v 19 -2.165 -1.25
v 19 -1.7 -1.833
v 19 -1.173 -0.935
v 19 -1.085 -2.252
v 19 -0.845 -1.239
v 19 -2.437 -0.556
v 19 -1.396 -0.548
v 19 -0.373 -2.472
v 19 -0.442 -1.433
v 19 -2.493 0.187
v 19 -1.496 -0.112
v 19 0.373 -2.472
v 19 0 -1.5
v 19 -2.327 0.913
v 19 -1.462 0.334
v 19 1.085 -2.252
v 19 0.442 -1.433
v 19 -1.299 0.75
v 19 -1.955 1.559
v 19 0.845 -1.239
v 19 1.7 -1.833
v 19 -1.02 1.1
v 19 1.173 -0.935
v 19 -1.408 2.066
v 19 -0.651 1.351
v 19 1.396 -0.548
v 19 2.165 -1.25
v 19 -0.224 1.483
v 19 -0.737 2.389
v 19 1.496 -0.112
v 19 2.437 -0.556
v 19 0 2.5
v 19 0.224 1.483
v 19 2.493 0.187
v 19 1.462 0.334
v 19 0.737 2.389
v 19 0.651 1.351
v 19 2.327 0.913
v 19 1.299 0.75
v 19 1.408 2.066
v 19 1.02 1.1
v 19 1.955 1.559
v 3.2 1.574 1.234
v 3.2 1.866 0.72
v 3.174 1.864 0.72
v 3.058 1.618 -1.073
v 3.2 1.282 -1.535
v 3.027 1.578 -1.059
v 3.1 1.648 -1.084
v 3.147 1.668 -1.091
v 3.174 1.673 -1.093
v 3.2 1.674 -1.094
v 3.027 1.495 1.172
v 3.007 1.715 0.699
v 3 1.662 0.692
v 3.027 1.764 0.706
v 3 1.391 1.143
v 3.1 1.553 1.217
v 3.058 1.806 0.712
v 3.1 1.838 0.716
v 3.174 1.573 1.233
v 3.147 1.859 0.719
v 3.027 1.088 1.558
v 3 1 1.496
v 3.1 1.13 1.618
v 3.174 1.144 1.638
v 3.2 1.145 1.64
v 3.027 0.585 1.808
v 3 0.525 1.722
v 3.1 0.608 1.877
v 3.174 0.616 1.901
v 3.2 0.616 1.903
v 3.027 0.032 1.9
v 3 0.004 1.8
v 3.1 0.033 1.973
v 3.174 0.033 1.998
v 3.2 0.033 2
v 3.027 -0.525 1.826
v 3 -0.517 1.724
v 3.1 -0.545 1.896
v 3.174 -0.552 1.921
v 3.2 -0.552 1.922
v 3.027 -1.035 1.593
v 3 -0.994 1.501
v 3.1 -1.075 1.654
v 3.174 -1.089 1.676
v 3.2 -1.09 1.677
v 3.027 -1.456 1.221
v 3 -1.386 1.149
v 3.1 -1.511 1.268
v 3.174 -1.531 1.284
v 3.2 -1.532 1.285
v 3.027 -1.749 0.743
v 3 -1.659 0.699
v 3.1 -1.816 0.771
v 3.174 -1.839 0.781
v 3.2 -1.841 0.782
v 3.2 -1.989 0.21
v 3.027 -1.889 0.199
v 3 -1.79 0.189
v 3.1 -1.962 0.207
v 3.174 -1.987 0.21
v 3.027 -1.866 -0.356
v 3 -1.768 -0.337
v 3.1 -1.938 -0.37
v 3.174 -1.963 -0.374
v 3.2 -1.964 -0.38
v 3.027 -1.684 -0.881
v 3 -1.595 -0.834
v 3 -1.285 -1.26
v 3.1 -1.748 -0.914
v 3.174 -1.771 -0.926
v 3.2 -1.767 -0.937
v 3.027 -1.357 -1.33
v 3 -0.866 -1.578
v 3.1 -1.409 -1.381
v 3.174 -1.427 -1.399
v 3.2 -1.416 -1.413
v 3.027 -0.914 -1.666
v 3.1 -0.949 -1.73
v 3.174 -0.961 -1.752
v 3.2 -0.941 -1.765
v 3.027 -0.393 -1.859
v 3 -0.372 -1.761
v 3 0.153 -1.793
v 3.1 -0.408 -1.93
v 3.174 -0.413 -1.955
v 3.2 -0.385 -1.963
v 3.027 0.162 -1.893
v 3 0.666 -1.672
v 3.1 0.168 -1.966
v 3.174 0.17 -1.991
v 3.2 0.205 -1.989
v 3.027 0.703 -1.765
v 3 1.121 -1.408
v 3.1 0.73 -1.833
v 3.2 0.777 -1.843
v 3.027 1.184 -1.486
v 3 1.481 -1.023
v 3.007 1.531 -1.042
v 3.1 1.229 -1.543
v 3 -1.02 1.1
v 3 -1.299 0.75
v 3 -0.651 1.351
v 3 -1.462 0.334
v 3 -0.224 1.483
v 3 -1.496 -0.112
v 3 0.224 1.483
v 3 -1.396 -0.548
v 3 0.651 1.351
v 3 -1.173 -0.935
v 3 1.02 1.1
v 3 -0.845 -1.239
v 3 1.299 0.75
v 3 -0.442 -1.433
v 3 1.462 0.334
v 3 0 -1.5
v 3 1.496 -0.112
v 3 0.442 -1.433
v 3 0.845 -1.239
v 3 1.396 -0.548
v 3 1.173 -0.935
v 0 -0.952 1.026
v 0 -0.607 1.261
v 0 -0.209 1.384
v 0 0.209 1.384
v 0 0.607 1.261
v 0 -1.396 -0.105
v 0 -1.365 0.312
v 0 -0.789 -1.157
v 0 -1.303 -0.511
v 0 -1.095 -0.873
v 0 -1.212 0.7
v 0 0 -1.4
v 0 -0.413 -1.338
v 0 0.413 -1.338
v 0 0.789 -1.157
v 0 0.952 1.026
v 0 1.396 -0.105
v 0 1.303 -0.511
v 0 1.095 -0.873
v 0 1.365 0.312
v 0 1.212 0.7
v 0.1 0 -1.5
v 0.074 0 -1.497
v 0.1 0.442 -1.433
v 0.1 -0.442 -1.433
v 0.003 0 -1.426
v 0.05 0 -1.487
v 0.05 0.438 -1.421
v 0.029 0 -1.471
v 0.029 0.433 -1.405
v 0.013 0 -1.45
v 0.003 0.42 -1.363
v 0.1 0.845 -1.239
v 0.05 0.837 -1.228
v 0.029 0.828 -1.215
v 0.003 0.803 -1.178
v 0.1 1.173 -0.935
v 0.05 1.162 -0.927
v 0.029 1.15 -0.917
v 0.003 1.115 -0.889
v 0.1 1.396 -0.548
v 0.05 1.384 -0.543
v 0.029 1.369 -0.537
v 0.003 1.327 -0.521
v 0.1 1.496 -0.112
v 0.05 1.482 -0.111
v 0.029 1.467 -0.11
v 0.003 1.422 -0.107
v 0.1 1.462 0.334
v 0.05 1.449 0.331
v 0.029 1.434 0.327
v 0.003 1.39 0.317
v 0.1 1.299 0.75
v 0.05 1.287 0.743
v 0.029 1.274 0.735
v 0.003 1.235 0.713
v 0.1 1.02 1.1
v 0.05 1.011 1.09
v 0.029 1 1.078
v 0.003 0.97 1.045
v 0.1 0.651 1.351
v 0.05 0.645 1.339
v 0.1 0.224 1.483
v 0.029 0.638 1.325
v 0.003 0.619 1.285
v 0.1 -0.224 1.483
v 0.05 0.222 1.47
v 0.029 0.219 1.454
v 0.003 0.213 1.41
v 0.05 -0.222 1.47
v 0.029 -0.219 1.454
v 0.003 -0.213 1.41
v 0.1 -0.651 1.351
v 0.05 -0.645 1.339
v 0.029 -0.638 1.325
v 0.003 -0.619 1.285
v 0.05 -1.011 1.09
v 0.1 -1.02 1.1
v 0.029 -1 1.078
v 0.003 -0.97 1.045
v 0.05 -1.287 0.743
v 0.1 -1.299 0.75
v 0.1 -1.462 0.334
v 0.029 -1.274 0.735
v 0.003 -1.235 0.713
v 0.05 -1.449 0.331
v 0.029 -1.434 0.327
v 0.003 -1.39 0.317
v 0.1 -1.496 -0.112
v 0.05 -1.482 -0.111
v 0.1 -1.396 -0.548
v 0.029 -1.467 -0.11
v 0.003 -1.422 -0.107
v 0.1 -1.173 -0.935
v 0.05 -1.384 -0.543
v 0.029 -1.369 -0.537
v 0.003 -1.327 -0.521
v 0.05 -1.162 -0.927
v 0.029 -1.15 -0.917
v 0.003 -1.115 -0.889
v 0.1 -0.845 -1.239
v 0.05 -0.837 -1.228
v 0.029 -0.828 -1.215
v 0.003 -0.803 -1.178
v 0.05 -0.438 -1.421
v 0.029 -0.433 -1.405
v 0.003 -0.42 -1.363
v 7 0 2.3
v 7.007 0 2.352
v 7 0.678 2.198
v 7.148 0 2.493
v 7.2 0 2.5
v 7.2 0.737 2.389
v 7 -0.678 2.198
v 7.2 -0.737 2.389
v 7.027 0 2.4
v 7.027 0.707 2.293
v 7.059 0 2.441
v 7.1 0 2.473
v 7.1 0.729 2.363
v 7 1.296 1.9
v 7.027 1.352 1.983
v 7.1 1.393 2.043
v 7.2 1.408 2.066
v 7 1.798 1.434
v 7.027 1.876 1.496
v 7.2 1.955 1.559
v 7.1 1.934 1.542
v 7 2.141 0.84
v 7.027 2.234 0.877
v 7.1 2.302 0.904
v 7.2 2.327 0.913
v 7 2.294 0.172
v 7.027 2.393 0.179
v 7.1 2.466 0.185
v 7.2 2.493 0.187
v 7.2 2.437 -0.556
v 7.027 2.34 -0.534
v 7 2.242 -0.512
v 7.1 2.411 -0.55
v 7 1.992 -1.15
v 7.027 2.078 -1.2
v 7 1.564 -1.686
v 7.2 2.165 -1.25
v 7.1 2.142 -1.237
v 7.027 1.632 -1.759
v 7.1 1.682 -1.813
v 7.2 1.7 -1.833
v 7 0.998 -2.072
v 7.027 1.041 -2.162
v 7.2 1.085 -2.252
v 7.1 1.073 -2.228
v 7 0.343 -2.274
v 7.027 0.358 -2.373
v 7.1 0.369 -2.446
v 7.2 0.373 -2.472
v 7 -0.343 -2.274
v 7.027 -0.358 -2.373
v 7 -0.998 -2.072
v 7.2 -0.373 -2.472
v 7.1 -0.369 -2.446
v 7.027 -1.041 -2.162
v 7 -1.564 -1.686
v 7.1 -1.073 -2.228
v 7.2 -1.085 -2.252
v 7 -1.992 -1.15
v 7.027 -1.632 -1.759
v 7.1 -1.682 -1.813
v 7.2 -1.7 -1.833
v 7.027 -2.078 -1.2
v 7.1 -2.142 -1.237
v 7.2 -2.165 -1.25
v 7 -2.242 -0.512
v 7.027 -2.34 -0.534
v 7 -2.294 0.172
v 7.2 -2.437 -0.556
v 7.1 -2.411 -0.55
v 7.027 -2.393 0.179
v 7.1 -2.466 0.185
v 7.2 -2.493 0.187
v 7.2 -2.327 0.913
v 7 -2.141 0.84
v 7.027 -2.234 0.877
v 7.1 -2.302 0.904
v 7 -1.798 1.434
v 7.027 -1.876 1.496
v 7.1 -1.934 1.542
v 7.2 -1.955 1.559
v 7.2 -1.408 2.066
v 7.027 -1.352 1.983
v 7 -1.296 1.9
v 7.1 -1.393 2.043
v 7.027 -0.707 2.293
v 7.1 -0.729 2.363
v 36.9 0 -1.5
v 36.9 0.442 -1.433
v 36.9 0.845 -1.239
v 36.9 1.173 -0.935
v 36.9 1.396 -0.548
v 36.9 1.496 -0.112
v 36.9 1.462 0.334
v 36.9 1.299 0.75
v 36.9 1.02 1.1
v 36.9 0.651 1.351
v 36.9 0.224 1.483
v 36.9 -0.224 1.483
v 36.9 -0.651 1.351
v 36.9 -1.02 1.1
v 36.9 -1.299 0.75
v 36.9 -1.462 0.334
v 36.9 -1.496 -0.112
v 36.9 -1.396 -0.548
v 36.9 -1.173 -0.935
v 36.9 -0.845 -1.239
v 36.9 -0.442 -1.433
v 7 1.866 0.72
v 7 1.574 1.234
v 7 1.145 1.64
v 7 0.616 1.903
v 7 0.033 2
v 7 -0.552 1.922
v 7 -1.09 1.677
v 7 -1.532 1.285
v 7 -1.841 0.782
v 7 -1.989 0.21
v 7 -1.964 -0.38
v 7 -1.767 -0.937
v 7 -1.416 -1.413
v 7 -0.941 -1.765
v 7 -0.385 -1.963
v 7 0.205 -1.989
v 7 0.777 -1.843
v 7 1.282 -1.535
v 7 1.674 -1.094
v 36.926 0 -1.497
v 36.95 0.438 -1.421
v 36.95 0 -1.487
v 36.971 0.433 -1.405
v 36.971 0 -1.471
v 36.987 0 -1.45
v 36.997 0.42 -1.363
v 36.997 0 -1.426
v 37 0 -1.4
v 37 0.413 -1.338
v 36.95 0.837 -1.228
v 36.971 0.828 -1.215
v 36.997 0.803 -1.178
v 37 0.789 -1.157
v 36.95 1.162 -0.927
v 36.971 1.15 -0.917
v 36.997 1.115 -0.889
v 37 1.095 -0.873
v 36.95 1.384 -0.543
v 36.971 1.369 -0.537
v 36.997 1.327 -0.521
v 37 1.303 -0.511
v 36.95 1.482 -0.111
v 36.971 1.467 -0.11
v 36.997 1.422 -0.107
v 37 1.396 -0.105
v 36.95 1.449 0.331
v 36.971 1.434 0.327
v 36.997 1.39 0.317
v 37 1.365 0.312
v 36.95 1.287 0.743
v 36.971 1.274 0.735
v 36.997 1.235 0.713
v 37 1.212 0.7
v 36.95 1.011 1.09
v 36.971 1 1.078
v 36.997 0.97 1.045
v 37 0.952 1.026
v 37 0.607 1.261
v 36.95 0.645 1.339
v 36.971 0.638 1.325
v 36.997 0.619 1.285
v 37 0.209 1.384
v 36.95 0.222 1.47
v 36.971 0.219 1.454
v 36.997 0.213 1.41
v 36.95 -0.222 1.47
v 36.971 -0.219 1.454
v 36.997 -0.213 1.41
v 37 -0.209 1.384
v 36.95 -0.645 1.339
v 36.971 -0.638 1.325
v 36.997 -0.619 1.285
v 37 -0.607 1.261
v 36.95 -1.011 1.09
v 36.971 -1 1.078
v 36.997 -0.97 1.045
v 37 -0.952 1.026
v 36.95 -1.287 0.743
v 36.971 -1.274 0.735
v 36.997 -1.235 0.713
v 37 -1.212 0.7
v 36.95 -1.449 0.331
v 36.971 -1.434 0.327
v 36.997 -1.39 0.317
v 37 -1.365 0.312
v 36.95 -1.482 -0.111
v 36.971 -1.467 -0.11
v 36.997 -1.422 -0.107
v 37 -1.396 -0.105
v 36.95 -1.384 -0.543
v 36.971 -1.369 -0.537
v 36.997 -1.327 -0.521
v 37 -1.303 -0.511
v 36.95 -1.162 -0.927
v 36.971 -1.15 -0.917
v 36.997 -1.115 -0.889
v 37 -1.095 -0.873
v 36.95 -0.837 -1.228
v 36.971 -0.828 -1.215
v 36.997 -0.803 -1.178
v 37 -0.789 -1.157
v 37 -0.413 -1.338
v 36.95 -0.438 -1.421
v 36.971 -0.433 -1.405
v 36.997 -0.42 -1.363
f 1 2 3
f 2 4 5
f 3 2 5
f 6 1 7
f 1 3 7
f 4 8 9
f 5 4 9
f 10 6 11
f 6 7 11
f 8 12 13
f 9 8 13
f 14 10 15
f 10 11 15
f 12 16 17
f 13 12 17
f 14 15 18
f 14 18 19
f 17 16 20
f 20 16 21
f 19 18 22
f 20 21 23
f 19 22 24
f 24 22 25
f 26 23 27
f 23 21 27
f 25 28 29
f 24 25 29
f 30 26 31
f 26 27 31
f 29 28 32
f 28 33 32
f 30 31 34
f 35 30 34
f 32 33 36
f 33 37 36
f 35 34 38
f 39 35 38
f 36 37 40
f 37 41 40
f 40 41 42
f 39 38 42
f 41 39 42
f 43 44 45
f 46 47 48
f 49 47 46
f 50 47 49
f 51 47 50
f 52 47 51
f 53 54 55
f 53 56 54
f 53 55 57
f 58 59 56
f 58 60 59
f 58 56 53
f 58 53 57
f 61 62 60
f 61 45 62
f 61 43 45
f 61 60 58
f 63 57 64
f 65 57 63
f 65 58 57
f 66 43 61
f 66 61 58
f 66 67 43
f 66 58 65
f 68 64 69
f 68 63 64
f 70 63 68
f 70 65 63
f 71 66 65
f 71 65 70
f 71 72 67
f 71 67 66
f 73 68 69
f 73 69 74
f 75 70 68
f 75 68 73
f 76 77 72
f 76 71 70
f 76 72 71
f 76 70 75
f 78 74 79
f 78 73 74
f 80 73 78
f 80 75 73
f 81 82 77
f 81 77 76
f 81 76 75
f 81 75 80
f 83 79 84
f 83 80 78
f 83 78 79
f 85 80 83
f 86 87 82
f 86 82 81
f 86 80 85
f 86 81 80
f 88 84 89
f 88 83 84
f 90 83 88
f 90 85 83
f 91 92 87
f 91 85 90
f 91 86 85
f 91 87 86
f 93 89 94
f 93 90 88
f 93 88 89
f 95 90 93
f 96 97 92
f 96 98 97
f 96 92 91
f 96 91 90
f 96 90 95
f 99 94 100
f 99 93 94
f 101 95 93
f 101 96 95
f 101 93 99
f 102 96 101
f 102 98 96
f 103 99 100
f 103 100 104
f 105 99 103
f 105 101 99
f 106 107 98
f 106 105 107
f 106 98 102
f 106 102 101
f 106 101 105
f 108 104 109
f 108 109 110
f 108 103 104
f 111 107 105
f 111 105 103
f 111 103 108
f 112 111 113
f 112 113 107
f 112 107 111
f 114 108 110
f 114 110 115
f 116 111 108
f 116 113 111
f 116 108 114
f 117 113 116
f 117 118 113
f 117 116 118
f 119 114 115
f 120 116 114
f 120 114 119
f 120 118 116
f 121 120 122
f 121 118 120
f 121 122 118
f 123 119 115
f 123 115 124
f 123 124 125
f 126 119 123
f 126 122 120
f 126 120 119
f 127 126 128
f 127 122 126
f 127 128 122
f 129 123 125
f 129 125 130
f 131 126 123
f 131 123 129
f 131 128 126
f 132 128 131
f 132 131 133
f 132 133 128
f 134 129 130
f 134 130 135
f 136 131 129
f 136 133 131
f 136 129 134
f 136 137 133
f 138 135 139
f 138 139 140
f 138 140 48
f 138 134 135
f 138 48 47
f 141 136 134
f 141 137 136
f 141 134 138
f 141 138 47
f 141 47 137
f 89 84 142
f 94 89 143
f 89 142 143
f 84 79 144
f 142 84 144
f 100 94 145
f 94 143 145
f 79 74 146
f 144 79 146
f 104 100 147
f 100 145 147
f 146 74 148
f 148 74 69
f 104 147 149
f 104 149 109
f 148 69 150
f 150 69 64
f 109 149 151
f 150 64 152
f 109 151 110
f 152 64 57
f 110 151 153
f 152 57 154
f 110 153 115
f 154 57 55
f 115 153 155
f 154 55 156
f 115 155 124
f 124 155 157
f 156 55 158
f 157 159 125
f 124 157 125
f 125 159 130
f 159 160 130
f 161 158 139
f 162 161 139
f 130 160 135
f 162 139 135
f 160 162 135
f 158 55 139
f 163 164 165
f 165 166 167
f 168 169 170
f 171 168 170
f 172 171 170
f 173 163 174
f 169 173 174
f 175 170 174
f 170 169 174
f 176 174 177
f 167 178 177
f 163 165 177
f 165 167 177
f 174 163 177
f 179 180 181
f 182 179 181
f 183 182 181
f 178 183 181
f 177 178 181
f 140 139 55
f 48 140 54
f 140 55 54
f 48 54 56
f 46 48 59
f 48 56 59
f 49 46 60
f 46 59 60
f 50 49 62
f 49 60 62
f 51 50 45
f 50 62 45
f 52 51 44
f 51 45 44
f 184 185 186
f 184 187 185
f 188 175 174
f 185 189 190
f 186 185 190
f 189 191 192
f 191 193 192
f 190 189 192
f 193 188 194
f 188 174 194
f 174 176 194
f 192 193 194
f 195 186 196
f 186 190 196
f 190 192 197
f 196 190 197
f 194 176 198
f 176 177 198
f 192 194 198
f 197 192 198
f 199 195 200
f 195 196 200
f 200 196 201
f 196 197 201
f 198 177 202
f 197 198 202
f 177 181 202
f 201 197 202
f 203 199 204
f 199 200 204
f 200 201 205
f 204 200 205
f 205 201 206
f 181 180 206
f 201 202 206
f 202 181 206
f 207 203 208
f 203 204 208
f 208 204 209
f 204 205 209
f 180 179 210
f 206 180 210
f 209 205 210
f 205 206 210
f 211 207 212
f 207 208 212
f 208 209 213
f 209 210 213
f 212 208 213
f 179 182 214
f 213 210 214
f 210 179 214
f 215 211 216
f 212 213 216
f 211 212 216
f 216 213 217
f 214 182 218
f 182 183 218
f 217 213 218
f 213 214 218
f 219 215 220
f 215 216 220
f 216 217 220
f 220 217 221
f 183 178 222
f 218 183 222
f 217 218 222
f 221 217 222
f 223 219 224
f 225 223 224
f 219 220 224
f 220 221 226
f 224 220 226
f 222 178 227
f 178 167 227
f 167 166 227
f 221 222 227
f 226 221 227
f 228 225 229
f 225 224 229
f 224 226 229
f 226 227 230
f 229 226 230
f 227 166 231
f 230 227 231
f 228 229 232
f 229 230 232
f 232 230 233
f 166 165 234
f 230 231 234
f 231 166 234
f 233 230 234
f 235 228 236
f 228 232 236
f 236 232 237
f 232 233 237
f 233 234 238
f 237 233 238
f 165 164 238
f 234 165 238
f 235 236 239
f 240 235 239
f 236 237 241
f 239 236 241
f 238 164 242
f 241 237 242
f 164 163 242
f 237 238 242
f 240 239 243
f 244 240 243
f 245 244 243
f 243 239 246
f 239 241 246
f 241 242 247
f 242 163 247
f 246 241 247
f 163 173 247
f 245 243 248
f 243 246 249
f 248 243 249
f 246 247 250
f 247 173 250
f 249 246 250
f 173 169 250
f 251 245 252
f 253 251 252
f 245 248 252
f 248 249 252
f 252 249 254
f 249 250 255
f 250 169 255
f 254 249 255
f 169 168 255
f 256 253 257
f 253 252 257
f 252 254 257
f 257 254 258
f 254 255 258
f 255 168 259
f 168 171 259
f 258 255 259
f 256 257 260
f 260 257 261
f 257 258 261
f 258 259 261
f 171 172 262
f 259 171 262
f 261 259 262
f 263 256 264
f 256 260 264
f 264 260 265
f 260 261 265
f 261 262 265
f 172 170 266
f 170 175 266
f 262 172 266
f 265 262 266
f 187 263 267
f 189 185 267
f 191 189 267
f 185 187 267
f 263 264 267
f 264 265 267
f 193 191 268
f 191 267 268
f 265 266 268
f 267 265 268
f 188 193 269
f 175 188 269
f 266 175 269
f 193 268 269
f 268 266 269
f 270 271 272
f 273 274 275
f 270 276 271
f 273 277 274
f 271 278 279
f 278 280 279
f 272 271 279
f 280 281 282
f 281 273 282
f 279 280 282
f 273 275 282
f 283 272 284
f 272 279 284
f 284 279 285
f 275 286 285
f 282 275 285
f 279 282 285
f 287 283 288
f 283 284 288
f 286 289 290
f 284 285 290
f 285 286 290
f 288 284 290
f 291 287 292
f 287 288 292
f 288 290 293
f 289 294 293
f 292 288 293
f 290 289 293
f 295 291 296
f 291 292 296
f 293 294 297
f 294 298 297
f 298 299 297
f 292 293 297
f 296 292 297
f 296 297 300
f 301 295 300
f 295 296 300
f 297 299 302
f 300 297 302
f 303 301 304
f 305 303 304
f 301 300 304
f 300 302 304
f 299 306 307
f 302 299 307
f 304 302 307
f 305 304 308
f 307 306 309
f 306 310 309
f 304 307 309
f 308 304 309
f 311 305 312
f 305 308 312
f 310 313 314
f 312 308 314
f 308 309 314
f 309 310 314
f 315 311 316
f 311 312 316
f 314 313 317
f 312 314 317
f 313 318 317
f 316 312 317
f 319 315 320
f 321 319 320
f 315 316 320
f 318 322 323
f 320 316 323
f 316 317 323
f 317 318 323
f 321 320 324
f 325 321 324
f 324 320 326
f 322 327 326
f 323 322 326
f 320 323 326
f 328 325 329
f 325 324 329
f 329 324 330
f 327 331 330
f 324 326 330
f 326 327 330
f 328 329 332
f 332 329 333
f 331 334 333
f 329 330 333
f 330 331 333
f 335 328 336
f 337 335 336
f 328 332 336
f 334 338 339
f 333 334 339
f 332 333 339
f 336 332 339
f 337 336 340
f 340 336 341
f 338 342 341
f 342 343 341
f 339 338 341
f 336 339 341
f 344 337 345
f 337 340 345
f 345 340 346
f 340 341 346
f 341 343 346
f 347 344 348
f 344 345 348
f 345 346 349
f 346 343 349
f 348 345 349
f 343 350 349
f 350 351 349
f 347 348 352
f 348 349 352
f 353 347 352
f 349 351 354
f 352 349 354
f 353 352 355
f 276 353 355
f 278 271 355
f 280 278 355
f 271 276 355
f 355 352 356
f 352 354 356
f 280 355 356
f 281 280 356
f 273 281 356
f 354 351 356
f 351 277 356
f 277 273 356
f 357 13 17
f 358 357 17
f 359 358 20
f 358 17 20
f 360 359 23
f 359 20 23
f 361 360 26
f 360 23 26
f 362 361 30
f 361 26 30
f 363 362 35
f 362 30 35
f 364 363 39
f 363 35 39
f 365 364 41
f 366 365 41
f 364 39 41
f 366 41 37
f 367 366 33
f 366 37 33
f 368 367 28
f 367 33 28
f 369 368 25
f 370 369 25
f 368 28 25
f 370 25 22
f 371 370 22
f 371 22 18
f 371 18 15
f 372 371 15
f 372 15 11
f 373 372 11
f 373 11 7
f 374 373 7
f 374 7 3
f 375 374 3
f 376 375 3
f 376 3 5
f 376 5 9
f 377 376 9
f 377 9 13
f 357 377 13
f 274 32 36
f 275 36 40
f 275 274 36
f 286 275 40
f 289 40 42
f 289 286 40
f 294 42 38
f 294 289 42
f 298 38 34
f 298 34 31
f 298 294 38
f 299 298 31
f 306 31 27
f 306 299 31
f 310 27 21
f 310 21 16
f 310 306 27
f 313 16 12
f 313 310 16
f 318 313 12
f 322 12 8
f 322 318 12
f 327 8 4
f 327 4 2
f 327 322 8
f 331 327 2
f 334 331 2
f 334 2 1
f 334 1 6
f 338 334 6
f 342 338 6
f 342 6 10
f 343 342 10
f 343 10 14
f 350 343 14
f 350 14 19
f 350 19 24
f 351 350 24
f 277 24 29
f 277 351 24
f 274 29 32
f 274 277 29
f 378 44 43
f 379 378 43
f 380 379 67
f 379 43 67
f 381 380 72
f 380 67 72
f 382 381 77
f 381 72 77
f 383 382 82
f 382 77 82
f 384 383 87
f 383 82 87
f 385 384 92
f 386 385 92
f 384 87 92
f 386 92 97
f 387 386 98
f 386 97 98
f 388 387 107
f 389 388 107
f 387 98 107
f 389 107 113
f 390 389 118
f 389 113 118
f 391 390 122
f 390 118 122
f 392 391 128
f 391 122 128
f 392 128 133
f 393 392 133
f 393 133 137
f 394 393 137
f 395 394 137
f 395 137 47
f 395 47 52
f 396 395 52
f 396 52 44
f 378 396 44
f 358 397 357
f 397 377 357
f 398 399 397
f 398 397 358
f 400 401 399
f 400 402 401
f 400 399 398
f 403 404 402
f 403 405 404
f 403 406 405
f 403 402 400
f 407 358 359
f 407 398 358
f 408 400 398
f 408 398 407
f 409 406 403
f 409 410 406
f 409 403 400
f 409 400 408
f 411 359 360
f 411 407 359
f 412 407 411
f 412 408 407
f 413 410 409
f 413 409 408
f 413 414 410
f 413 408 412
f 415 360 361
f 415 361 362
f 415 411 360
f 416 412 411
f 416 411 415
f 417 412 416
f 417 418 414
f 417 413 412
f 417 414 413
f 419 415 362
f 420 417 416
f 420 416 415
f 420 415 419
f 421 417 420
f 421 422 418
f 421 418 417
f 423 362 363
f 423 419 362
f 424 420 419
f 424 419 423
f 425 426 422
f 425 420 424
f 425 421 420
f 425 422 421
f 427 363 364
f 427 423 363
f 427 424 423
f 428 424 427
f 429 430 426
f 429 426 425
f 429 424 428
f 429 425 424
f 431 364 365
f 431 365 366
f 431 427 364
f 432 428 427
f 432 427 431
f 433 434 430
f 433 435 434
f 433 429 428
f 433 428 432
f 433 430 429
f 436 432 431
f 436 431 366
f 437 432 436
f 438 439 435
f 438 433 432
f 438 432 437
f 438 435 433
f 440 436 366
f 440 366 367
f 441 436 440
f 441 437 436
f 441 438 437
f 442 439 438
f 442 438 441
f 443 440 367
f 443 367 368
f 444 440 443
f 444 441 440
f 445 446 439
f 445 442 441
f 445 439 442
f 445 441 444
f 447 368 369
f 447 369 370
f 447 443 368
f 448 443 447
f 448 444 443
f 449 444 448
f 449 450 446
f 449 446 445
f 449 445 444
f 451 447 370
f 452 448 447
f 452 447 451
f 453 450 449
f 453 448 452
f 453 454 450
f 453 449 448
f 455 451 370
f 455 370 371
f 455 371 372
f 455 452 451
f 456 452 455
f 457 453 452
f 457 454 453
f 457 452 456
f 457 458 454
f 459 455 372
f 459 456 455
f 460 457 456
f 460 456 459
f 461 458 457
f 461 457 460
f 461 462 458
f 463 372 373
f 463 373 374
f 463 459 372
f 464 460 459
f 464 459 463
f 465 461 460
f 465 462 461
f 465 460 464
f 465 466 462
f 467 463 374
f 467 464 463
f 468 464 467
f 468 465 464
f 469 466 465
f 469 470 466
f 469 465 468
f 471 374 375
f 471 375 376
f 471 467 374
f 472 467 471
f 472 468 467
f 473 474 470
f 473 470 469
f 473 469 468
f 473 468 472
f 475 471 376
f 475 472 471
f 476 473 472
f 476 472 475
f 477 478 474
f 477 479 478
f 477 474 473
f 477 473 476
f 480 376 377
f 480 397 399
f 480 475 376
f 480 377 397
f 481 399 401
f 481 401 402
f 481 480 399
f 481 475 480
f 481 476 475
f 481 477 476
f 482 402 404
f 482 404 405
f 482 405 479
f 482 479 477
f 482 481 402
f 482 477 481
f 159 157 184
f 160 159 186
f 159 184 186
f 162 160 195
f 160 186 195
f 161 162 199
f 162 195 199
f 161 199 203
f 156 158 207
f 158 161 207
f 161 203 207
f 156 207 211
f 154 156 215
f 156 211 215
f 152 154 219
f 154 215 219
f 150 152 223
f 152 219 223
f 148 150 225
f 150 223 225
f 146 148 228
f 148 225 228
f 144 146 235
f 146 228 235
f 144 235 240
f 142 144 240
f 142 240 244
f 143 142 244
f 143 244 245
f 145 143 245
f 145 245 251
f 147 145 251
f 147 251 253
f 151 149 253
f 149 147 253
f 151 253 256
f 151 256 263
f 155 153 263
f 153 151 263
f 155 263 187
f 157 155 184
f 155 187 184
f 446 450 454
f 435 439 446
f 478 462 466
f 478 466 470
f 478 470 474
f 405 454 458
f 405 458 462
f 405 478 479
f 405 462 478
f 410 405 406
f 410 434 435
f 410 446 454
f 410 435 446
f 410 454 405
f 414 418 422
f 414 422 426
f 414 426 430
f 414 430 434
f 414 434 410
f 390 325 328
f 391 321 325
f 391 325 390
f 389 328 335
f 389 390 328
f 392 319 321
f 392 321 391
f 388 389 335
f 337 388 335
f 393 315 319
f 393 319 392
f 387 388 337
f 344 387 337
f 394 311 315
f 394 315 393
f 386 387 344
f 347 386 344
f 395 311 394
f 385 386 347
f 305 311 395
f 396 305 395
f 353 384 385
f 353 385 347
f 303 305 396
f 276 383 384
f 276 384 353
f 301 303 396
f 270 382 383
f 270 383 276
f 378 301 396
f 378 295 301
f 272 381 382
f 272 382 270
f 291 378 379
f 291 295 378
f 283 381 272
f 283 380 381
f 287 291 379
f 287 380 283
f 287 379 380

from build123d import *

# Parameters (mm, degrees)
SKETCH_1_R      = 1.5
EXTRUDE_1_DEPTH = 37
EXTRUDE_START   = -7
SKETCH_2_R      = 2.5
SKETCH_2_R_2    = 1
EXTRUDE_2_DEPTH = 12
EXTRUDE_START_2 = 3
SKETCH_3_R      = 1
EXTRUDE_4_DEPTH = 4
FILLET_1_R      = 0.1
FILLET_2_R      = 0.2


with BuildPart() as part:
    # 草图1 → 凸台-拉伸1 (new body)
    with BuildSketch(Plane(origin=(0, 0, 0), x_dir=(0, 0, -1), z_dir=(1, 0, 0))):
        Circle(SKETCH_1_R)
    extrude(amount=EXTRUDE_1_DEPTH)

    # 草图2 → 凸台-拉伸2 (add)
    with BuildSketch(Plane.ZY.offset(EXTRUDE_START)):
        Circle(SKETCH_2_R)
        Circle(SKETCH_2_R_2, mode=Mode.SUBTRACT)
    extrude(amount=-EXTRUDE_2_DEPTH)

    # 草图3 → 凸台-拉伸4 (add)
    with BuildSketch(Plane(origin=(0, 0, 0), x_dir=(0, 0, -1), z_dir=(1, 0, 0)).offset(EXTRUDE_START_2)):
        with BuildLine():
            Line((1.093724045, 1.674445494), (-0.720042675, 1.865888139))
            ThreePointArc((-0.720042675, 1.865888139), (-0.209933354, -1.988951479), (1.093724045, 1.674445494))
        make_face()
        Circle(SKETCH_3_R, mode=Mode.SUBTRACT)
    extrude(amount=EXTRUDE_4_DEPTH)

    # 圆角1
    fillet_1_edges = [part.edges().sort_by_distance(p)[0] for p in [
        (0, 0, 1.5),
        (37, 0, 1.5),
    ]]
    fillet(fillet_1_edges, radius=FILLET_1_R)

    # 圆角2
    fillet_2_edges = [part.edges().sort_by_distance(p)[0] for p in [
        (3, -1.988951479, 0.209933354),
        (3, 1.770166817, -0.186840685),
        (7, 0, -2.5),
    ]]
    fillet(fillet_2_edges, radius=FILLET_2_R)


solid = part.part
